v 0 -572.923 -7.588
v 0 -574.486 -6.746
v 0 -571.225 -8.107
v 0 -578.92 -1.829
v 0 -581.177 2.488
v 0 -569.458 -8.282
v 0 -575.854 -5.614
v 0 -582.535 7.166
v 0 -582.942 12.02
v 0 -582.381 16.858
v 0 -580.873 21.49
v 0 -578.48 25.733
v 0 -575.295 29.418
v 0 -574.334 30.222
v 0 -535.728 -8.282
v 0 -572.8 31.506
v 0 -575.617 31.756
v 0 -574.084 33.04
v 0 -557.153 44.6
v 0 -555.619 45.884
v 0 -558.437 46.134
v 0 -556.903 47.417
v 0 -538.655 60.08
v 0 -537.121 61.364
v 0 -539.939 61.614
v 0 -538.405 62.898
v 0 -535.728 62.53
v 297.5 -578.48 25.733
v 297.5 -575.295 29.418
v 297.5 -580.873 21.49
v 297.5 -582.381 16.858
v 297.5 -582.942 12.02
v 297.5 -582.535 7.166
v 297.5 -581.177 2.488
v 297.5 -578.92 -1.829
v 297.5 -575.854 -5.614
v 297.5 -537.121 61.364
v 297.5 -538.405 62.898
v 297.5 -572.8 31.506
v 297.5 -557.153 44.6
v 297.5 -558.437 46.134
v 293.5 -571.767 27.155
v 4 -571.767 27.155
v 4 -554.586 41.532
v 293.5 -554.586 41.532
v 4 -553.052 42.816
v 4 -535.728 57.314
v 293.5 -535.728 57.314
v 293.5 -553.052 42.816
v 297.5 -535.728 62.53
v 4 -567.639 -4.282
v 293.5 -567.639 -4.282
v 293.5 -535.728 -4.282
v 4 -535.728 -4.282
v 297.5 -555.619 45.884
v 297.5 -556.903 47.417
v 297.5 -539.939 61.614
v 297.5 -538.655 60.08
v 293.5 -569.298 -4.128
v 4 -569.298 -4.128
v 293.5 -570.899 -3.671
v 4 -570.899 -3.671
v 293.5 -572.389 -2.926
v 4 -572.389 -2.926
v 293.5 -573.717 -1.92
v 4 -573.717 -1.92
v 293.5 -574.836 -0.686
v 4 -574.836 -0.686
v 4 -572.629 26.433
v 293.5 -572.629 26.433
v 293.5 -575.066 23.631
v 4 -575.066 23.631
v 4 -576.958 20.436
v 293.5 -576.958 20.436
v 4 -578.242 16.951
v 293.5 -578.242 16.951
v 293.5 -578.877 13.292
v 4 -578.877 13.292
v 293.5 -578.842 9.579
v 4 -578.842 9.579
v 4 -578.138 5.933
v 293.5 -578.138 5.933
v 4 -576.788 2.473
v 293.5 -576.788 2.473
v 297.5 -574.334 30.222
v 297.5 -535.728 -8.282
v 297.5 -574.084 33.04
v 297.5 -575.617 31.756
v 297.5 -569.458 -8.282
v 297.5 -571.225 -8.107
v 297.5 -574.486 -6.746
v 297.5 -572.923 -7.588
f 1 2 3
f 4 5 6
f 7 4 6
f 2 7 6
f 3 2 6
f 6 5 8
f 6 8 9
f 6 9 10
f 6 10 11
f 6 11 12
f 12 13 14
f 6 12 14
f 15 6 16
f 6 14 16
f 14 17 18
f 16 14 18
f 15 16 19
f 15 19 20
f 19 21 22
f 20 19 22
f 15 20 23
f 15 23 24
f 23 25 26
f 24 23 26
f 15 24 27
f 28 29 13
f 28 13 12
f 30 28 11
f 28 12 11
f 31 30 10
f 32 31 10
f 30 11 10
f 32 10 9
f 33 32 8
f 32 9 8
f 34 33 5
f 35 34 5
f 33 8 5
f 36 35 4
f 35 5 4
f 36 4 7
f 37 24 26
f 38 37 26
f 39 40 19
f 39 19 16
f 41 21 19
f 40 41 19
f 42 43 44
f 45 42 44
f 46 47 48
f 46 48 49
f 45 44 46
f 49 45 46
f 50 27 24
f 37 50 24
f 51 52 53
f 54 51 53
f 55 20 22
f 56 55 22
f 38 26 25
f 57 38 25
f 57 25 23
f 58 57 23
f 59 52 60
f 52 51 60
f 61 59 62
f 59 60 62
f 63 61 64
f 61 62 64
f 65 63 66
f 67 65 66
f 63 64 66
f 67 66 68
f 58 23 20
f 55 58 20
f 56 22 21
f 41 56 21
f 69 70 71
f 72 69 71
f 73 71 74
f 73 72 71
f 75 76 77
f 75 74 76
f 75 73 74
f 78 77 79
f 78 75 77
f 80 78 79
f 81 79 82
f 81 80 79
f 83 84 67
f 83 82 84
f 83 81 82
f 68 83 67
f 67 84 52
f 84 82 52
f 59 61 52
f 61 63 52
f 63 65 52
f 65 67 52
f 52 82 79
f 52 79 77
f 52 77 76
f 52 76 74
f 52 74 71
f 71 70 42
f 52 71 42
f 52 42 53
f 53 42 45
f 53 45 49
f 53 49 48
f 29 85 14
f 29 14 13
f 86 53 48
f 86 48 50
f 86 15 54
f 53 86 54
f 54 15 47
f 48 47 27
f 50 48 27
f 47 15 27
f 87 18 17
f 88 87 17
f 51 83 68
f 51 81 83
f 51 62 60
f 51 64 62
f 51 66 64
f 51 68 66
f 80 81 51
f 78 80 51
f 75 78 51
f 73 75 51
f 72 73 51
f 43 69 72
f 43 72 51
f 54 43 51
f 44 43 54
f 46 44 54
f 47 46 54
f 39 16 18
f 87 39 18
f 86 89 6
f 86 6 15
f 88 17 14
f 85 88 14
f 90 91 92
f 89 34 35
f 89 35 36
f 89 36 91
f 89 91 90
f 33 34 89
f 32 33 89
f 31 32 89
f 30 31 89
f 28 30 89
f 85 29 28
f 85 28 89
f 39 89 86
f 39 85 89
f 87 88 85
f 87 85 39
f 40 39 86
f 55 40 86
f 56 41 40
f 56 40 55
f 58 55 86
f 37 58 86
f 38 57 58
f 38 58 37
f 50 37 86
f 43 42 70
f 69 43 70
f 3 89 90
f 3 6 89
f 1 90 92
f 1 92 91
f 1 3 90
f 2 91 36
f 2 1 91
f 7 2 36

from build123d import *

# Parameters (mm, degrees)
F1_DEPTH    = 55.5
F2_DEPTH    = 297.5
F3_T        = 4
F3_T3_DEPTH = 305.5
F4_R        = 9
F5_R        = 9


# Not quite as in the source:
# - a shell that OpenCascade refuses in one call is made with other operations: the cavity is built on its own and cut out
# - a feature names something its author has since deleted; it is built from what else it names


with BuildPart() as f1:
    # F0 (on Right) → F1 (new body)
    with BuildSketch(Plane.YZ):
        with BuildLine():
            Line((-572.7275457045, -8.2819332473), (-535.7275457045, -8.2819332473))
            Line((-535.7275457045, -8.2819332473), (-535.7275457045, 62.5302098664))
            Line((-535.7275457045, 62.5302098664), (-537.1212494235, 61.363881769))
            Line((-537.1212494235, 61.363881769), (-538.6550321213, 60.0803278606))
            Line((-538.6550321213, 60.0803278606), (-555.619452014, 45.8835661626))
            Line((-555.619452014, 45.8835661626), (-557.1532347119, 44.6000122542))
            Line((-557.1532347119, 44.6000122542), (-572.8000965488, 31.5058557652))
            Line((-572.8000965488, 31.5058557652), (-574.3338792466, 30.2223018568))
            Line((-574.3338792466, 30.2223018568), (-575.2947741996, 29.4181719927))
            ThreePointArc((-575.2947741996, 29.4181719927), (-582.8883712939, 9.9636162879), (-572.7275457045, -8.2819332473))
        make_face()
        Polygon((-538.6550321213, 60.0803278606), (-537.1212494235, 61.363881769), (-538.404803332, 62.8976644668), (-539.9385860298, 61.6141105584), align=None)
        Polygon((-575.6174331551, 31.7560845546), (-574.3338792466, 30.2223018568), (-572.8000965488, 31.5058557652), (-574.0836504573, 33.0396384631), align=None)
        Polygon((-557.1532347119, 44.6000122542), (-555.619452014, 45.8835661626), (-556.9030059225, 47.4173488605), (-558.4367886203, 46.133794952), align=None)
    extrude(amount=F1_DEPTH)

    # F0 (on Right) → F2 (join)
    with BuildSketch(Plane.YZ):
        with BuildLine():
            Line((-572.7275457045, -8.2819332473), (-535.7275457045, -8.2819332473))
            Line((-535.7275457045, -8.2819332473), (-535.7275457045, 62.5302098664))
            Line((-535.7275457045, 62.5302098664), (-537.1212494235, 61.363881769))
            Line((-537.1212494235, 61.363881769), (-538.6550321213, 60.0803278606))
            Line((-538.6550321213, 60.0803278606), (-555.619452014, 45.8835661626))
            Line((-555.619452014, 45.8835661626), (-557.1532347119, 44.6000122542))
            Line((-557.1532347119, 44.6000122542), (-572.8000965488, 31.5058557652))
            Line((-572.8000965488, 31.5058557652), (-574.3338792466, 30.2223018568))
            Line((-574.3338792466, 30.2223018568), (-575.2947741996, 29.4181719927))
            ThreePointArc((-575.2947741996, 29.4181719927), (-582.8883712939, 9.9636162879), (-572.7275457045, -8.2819332473))
        make_face()
        Polygon((-538.6550321213, 60.0803278606), (-537.1212494235, 61.363881769), (-538.404803332, 62.8976644668), (-539.9385860298, 61.6141105584), align=None)
        Polygon((-575.6174331551, 31.7560845546), (-574.3338792466, 30.2223018568), (-572.8000965488, 31.5058557652), (-574.0836504573, 33.0396384631), align=None)
        Polygon((-557.1532347119, 44.6000122542), (-555.619452014, 45.8835661626), (-556.9030059225, 47.4173488605), (-558.4367886203, 46.133794952), align=None)
    extrude(amount=F2_DEPTH)

    # F3: shell of thickness 4, made by hand


with BuildPart() as f3_core1:
    # F3_t2: copy of F1
    add(f1.part)

    # the walls: a layer under each face that stays
    f3_faces = [f3_core1.faces().sort_by_distance(p)[0] for p in [
        (148.75, -582.8883712939, 9.9636162879),
        (0, -559.3362720247, 27.3078656098),
        (148.75, -574.9756562009, 30.9891932057),
        (148.75, -574.8505418062, 32.3978615088),
        (148.75, -573.441873503, 32.2727471141),
        (148.75, -564.9766656303, 38.0529340097),
        (148.75, -557.7950116661, 45.3669036031),
        (148.75, -557.6698972714, 46.7755719063),
        (148.75, -556.2612289683, 46.6504575116),
        (148.75, -547.1372420677, 52.9819470116),
        (148.75, -539.2968090756, 60.8472192095),
        (148.75, -539.1716946809, 62.2558875126),
        (148.75, -537.7630263777, 62.1307731179),
        (148.75, -536.424397564, 61.9470458177),
        (148.75, -554.2275457045, -8.2819332473),
        (297.5, -559.3362720247, 27.3078656098),
        (148.75, -574.8143267231, 29.8202369247),
    ]]
    thicken(f3_faces, amount=-F3_T, mode=Mode.SUBTRACT)

    # F3_s4 → F3_t3 (cut)
    with BuildSketch(Plane.YZ.offset(-4)):
        Polygon((-574.3902259788, 30.2273064326), (-571.266313851, 32.7894096737), (-568.6992060341, 29.721844278), (-571.7667714298, 27.1547364611), align=None)
        Polygon((-572.795091973, 31.5622024973), (-575.8676619445, 28.9387479484), (-573.3005541276, 25.8711825527), (-570.232988732, 28.4382903696), align=None)
        Polygon((-557.209581444, 44.60501683), (-554.586126895, 41.5324468586), (-551.5185614994, 44.0995546754), (-554.0856693162, 47.1671200711), align=None)
        Polygon((-555.6144474383, 45.9399128948), (-558.6870174097, 43.3164583458), (-556.1199095928, 40.2488929501), (-553.0523441972, 42.816000767), align=None)
        Polygon((-538.7113788535, 60.0853324364), (-536.0879243045, 57.0127624649), (-533.0203589088, 59.5798702818), (-535.5874667257, 62.6474356775), align=None)
        Polygon((-537.1162448477, 61.4202285011), (-540.1888148192, 58.7967739522), (-537.6217070023, 55.7292085565), (-534.5541416067, 58.2963163734), align=None)
    extrude(amount=F3_T3_DEPTH, mode=Mode.SUBTRACT)


with BuildPart() as f1_1:
    add(f1.part)

    # what is left inside the walls is the cavity
    f3_cavity = [f3_core1.part.solids().sort_by_distance(p)[0] for p in [
        (197, -535.767546, 26.516207),
    ]]
    add(f3_cavity, mode=Mode.SUBTRACT)

    # F4
    f4_edges = [f1_1.edges().sort_by_distance(p)[0] for p in [
        (148.75, -572.727546, -8.281933),
    ]]
    fillet(f4_edges, radius=F4_R)

    # F5
    f5_edges = [f1_1.edges().sort_by_distance(p)[0] for p in [
        (148.75, -571.376781, -4.281933),
    ]]
    fillet(f5_edges, radius=F5_R)


solid = f1_1.part
